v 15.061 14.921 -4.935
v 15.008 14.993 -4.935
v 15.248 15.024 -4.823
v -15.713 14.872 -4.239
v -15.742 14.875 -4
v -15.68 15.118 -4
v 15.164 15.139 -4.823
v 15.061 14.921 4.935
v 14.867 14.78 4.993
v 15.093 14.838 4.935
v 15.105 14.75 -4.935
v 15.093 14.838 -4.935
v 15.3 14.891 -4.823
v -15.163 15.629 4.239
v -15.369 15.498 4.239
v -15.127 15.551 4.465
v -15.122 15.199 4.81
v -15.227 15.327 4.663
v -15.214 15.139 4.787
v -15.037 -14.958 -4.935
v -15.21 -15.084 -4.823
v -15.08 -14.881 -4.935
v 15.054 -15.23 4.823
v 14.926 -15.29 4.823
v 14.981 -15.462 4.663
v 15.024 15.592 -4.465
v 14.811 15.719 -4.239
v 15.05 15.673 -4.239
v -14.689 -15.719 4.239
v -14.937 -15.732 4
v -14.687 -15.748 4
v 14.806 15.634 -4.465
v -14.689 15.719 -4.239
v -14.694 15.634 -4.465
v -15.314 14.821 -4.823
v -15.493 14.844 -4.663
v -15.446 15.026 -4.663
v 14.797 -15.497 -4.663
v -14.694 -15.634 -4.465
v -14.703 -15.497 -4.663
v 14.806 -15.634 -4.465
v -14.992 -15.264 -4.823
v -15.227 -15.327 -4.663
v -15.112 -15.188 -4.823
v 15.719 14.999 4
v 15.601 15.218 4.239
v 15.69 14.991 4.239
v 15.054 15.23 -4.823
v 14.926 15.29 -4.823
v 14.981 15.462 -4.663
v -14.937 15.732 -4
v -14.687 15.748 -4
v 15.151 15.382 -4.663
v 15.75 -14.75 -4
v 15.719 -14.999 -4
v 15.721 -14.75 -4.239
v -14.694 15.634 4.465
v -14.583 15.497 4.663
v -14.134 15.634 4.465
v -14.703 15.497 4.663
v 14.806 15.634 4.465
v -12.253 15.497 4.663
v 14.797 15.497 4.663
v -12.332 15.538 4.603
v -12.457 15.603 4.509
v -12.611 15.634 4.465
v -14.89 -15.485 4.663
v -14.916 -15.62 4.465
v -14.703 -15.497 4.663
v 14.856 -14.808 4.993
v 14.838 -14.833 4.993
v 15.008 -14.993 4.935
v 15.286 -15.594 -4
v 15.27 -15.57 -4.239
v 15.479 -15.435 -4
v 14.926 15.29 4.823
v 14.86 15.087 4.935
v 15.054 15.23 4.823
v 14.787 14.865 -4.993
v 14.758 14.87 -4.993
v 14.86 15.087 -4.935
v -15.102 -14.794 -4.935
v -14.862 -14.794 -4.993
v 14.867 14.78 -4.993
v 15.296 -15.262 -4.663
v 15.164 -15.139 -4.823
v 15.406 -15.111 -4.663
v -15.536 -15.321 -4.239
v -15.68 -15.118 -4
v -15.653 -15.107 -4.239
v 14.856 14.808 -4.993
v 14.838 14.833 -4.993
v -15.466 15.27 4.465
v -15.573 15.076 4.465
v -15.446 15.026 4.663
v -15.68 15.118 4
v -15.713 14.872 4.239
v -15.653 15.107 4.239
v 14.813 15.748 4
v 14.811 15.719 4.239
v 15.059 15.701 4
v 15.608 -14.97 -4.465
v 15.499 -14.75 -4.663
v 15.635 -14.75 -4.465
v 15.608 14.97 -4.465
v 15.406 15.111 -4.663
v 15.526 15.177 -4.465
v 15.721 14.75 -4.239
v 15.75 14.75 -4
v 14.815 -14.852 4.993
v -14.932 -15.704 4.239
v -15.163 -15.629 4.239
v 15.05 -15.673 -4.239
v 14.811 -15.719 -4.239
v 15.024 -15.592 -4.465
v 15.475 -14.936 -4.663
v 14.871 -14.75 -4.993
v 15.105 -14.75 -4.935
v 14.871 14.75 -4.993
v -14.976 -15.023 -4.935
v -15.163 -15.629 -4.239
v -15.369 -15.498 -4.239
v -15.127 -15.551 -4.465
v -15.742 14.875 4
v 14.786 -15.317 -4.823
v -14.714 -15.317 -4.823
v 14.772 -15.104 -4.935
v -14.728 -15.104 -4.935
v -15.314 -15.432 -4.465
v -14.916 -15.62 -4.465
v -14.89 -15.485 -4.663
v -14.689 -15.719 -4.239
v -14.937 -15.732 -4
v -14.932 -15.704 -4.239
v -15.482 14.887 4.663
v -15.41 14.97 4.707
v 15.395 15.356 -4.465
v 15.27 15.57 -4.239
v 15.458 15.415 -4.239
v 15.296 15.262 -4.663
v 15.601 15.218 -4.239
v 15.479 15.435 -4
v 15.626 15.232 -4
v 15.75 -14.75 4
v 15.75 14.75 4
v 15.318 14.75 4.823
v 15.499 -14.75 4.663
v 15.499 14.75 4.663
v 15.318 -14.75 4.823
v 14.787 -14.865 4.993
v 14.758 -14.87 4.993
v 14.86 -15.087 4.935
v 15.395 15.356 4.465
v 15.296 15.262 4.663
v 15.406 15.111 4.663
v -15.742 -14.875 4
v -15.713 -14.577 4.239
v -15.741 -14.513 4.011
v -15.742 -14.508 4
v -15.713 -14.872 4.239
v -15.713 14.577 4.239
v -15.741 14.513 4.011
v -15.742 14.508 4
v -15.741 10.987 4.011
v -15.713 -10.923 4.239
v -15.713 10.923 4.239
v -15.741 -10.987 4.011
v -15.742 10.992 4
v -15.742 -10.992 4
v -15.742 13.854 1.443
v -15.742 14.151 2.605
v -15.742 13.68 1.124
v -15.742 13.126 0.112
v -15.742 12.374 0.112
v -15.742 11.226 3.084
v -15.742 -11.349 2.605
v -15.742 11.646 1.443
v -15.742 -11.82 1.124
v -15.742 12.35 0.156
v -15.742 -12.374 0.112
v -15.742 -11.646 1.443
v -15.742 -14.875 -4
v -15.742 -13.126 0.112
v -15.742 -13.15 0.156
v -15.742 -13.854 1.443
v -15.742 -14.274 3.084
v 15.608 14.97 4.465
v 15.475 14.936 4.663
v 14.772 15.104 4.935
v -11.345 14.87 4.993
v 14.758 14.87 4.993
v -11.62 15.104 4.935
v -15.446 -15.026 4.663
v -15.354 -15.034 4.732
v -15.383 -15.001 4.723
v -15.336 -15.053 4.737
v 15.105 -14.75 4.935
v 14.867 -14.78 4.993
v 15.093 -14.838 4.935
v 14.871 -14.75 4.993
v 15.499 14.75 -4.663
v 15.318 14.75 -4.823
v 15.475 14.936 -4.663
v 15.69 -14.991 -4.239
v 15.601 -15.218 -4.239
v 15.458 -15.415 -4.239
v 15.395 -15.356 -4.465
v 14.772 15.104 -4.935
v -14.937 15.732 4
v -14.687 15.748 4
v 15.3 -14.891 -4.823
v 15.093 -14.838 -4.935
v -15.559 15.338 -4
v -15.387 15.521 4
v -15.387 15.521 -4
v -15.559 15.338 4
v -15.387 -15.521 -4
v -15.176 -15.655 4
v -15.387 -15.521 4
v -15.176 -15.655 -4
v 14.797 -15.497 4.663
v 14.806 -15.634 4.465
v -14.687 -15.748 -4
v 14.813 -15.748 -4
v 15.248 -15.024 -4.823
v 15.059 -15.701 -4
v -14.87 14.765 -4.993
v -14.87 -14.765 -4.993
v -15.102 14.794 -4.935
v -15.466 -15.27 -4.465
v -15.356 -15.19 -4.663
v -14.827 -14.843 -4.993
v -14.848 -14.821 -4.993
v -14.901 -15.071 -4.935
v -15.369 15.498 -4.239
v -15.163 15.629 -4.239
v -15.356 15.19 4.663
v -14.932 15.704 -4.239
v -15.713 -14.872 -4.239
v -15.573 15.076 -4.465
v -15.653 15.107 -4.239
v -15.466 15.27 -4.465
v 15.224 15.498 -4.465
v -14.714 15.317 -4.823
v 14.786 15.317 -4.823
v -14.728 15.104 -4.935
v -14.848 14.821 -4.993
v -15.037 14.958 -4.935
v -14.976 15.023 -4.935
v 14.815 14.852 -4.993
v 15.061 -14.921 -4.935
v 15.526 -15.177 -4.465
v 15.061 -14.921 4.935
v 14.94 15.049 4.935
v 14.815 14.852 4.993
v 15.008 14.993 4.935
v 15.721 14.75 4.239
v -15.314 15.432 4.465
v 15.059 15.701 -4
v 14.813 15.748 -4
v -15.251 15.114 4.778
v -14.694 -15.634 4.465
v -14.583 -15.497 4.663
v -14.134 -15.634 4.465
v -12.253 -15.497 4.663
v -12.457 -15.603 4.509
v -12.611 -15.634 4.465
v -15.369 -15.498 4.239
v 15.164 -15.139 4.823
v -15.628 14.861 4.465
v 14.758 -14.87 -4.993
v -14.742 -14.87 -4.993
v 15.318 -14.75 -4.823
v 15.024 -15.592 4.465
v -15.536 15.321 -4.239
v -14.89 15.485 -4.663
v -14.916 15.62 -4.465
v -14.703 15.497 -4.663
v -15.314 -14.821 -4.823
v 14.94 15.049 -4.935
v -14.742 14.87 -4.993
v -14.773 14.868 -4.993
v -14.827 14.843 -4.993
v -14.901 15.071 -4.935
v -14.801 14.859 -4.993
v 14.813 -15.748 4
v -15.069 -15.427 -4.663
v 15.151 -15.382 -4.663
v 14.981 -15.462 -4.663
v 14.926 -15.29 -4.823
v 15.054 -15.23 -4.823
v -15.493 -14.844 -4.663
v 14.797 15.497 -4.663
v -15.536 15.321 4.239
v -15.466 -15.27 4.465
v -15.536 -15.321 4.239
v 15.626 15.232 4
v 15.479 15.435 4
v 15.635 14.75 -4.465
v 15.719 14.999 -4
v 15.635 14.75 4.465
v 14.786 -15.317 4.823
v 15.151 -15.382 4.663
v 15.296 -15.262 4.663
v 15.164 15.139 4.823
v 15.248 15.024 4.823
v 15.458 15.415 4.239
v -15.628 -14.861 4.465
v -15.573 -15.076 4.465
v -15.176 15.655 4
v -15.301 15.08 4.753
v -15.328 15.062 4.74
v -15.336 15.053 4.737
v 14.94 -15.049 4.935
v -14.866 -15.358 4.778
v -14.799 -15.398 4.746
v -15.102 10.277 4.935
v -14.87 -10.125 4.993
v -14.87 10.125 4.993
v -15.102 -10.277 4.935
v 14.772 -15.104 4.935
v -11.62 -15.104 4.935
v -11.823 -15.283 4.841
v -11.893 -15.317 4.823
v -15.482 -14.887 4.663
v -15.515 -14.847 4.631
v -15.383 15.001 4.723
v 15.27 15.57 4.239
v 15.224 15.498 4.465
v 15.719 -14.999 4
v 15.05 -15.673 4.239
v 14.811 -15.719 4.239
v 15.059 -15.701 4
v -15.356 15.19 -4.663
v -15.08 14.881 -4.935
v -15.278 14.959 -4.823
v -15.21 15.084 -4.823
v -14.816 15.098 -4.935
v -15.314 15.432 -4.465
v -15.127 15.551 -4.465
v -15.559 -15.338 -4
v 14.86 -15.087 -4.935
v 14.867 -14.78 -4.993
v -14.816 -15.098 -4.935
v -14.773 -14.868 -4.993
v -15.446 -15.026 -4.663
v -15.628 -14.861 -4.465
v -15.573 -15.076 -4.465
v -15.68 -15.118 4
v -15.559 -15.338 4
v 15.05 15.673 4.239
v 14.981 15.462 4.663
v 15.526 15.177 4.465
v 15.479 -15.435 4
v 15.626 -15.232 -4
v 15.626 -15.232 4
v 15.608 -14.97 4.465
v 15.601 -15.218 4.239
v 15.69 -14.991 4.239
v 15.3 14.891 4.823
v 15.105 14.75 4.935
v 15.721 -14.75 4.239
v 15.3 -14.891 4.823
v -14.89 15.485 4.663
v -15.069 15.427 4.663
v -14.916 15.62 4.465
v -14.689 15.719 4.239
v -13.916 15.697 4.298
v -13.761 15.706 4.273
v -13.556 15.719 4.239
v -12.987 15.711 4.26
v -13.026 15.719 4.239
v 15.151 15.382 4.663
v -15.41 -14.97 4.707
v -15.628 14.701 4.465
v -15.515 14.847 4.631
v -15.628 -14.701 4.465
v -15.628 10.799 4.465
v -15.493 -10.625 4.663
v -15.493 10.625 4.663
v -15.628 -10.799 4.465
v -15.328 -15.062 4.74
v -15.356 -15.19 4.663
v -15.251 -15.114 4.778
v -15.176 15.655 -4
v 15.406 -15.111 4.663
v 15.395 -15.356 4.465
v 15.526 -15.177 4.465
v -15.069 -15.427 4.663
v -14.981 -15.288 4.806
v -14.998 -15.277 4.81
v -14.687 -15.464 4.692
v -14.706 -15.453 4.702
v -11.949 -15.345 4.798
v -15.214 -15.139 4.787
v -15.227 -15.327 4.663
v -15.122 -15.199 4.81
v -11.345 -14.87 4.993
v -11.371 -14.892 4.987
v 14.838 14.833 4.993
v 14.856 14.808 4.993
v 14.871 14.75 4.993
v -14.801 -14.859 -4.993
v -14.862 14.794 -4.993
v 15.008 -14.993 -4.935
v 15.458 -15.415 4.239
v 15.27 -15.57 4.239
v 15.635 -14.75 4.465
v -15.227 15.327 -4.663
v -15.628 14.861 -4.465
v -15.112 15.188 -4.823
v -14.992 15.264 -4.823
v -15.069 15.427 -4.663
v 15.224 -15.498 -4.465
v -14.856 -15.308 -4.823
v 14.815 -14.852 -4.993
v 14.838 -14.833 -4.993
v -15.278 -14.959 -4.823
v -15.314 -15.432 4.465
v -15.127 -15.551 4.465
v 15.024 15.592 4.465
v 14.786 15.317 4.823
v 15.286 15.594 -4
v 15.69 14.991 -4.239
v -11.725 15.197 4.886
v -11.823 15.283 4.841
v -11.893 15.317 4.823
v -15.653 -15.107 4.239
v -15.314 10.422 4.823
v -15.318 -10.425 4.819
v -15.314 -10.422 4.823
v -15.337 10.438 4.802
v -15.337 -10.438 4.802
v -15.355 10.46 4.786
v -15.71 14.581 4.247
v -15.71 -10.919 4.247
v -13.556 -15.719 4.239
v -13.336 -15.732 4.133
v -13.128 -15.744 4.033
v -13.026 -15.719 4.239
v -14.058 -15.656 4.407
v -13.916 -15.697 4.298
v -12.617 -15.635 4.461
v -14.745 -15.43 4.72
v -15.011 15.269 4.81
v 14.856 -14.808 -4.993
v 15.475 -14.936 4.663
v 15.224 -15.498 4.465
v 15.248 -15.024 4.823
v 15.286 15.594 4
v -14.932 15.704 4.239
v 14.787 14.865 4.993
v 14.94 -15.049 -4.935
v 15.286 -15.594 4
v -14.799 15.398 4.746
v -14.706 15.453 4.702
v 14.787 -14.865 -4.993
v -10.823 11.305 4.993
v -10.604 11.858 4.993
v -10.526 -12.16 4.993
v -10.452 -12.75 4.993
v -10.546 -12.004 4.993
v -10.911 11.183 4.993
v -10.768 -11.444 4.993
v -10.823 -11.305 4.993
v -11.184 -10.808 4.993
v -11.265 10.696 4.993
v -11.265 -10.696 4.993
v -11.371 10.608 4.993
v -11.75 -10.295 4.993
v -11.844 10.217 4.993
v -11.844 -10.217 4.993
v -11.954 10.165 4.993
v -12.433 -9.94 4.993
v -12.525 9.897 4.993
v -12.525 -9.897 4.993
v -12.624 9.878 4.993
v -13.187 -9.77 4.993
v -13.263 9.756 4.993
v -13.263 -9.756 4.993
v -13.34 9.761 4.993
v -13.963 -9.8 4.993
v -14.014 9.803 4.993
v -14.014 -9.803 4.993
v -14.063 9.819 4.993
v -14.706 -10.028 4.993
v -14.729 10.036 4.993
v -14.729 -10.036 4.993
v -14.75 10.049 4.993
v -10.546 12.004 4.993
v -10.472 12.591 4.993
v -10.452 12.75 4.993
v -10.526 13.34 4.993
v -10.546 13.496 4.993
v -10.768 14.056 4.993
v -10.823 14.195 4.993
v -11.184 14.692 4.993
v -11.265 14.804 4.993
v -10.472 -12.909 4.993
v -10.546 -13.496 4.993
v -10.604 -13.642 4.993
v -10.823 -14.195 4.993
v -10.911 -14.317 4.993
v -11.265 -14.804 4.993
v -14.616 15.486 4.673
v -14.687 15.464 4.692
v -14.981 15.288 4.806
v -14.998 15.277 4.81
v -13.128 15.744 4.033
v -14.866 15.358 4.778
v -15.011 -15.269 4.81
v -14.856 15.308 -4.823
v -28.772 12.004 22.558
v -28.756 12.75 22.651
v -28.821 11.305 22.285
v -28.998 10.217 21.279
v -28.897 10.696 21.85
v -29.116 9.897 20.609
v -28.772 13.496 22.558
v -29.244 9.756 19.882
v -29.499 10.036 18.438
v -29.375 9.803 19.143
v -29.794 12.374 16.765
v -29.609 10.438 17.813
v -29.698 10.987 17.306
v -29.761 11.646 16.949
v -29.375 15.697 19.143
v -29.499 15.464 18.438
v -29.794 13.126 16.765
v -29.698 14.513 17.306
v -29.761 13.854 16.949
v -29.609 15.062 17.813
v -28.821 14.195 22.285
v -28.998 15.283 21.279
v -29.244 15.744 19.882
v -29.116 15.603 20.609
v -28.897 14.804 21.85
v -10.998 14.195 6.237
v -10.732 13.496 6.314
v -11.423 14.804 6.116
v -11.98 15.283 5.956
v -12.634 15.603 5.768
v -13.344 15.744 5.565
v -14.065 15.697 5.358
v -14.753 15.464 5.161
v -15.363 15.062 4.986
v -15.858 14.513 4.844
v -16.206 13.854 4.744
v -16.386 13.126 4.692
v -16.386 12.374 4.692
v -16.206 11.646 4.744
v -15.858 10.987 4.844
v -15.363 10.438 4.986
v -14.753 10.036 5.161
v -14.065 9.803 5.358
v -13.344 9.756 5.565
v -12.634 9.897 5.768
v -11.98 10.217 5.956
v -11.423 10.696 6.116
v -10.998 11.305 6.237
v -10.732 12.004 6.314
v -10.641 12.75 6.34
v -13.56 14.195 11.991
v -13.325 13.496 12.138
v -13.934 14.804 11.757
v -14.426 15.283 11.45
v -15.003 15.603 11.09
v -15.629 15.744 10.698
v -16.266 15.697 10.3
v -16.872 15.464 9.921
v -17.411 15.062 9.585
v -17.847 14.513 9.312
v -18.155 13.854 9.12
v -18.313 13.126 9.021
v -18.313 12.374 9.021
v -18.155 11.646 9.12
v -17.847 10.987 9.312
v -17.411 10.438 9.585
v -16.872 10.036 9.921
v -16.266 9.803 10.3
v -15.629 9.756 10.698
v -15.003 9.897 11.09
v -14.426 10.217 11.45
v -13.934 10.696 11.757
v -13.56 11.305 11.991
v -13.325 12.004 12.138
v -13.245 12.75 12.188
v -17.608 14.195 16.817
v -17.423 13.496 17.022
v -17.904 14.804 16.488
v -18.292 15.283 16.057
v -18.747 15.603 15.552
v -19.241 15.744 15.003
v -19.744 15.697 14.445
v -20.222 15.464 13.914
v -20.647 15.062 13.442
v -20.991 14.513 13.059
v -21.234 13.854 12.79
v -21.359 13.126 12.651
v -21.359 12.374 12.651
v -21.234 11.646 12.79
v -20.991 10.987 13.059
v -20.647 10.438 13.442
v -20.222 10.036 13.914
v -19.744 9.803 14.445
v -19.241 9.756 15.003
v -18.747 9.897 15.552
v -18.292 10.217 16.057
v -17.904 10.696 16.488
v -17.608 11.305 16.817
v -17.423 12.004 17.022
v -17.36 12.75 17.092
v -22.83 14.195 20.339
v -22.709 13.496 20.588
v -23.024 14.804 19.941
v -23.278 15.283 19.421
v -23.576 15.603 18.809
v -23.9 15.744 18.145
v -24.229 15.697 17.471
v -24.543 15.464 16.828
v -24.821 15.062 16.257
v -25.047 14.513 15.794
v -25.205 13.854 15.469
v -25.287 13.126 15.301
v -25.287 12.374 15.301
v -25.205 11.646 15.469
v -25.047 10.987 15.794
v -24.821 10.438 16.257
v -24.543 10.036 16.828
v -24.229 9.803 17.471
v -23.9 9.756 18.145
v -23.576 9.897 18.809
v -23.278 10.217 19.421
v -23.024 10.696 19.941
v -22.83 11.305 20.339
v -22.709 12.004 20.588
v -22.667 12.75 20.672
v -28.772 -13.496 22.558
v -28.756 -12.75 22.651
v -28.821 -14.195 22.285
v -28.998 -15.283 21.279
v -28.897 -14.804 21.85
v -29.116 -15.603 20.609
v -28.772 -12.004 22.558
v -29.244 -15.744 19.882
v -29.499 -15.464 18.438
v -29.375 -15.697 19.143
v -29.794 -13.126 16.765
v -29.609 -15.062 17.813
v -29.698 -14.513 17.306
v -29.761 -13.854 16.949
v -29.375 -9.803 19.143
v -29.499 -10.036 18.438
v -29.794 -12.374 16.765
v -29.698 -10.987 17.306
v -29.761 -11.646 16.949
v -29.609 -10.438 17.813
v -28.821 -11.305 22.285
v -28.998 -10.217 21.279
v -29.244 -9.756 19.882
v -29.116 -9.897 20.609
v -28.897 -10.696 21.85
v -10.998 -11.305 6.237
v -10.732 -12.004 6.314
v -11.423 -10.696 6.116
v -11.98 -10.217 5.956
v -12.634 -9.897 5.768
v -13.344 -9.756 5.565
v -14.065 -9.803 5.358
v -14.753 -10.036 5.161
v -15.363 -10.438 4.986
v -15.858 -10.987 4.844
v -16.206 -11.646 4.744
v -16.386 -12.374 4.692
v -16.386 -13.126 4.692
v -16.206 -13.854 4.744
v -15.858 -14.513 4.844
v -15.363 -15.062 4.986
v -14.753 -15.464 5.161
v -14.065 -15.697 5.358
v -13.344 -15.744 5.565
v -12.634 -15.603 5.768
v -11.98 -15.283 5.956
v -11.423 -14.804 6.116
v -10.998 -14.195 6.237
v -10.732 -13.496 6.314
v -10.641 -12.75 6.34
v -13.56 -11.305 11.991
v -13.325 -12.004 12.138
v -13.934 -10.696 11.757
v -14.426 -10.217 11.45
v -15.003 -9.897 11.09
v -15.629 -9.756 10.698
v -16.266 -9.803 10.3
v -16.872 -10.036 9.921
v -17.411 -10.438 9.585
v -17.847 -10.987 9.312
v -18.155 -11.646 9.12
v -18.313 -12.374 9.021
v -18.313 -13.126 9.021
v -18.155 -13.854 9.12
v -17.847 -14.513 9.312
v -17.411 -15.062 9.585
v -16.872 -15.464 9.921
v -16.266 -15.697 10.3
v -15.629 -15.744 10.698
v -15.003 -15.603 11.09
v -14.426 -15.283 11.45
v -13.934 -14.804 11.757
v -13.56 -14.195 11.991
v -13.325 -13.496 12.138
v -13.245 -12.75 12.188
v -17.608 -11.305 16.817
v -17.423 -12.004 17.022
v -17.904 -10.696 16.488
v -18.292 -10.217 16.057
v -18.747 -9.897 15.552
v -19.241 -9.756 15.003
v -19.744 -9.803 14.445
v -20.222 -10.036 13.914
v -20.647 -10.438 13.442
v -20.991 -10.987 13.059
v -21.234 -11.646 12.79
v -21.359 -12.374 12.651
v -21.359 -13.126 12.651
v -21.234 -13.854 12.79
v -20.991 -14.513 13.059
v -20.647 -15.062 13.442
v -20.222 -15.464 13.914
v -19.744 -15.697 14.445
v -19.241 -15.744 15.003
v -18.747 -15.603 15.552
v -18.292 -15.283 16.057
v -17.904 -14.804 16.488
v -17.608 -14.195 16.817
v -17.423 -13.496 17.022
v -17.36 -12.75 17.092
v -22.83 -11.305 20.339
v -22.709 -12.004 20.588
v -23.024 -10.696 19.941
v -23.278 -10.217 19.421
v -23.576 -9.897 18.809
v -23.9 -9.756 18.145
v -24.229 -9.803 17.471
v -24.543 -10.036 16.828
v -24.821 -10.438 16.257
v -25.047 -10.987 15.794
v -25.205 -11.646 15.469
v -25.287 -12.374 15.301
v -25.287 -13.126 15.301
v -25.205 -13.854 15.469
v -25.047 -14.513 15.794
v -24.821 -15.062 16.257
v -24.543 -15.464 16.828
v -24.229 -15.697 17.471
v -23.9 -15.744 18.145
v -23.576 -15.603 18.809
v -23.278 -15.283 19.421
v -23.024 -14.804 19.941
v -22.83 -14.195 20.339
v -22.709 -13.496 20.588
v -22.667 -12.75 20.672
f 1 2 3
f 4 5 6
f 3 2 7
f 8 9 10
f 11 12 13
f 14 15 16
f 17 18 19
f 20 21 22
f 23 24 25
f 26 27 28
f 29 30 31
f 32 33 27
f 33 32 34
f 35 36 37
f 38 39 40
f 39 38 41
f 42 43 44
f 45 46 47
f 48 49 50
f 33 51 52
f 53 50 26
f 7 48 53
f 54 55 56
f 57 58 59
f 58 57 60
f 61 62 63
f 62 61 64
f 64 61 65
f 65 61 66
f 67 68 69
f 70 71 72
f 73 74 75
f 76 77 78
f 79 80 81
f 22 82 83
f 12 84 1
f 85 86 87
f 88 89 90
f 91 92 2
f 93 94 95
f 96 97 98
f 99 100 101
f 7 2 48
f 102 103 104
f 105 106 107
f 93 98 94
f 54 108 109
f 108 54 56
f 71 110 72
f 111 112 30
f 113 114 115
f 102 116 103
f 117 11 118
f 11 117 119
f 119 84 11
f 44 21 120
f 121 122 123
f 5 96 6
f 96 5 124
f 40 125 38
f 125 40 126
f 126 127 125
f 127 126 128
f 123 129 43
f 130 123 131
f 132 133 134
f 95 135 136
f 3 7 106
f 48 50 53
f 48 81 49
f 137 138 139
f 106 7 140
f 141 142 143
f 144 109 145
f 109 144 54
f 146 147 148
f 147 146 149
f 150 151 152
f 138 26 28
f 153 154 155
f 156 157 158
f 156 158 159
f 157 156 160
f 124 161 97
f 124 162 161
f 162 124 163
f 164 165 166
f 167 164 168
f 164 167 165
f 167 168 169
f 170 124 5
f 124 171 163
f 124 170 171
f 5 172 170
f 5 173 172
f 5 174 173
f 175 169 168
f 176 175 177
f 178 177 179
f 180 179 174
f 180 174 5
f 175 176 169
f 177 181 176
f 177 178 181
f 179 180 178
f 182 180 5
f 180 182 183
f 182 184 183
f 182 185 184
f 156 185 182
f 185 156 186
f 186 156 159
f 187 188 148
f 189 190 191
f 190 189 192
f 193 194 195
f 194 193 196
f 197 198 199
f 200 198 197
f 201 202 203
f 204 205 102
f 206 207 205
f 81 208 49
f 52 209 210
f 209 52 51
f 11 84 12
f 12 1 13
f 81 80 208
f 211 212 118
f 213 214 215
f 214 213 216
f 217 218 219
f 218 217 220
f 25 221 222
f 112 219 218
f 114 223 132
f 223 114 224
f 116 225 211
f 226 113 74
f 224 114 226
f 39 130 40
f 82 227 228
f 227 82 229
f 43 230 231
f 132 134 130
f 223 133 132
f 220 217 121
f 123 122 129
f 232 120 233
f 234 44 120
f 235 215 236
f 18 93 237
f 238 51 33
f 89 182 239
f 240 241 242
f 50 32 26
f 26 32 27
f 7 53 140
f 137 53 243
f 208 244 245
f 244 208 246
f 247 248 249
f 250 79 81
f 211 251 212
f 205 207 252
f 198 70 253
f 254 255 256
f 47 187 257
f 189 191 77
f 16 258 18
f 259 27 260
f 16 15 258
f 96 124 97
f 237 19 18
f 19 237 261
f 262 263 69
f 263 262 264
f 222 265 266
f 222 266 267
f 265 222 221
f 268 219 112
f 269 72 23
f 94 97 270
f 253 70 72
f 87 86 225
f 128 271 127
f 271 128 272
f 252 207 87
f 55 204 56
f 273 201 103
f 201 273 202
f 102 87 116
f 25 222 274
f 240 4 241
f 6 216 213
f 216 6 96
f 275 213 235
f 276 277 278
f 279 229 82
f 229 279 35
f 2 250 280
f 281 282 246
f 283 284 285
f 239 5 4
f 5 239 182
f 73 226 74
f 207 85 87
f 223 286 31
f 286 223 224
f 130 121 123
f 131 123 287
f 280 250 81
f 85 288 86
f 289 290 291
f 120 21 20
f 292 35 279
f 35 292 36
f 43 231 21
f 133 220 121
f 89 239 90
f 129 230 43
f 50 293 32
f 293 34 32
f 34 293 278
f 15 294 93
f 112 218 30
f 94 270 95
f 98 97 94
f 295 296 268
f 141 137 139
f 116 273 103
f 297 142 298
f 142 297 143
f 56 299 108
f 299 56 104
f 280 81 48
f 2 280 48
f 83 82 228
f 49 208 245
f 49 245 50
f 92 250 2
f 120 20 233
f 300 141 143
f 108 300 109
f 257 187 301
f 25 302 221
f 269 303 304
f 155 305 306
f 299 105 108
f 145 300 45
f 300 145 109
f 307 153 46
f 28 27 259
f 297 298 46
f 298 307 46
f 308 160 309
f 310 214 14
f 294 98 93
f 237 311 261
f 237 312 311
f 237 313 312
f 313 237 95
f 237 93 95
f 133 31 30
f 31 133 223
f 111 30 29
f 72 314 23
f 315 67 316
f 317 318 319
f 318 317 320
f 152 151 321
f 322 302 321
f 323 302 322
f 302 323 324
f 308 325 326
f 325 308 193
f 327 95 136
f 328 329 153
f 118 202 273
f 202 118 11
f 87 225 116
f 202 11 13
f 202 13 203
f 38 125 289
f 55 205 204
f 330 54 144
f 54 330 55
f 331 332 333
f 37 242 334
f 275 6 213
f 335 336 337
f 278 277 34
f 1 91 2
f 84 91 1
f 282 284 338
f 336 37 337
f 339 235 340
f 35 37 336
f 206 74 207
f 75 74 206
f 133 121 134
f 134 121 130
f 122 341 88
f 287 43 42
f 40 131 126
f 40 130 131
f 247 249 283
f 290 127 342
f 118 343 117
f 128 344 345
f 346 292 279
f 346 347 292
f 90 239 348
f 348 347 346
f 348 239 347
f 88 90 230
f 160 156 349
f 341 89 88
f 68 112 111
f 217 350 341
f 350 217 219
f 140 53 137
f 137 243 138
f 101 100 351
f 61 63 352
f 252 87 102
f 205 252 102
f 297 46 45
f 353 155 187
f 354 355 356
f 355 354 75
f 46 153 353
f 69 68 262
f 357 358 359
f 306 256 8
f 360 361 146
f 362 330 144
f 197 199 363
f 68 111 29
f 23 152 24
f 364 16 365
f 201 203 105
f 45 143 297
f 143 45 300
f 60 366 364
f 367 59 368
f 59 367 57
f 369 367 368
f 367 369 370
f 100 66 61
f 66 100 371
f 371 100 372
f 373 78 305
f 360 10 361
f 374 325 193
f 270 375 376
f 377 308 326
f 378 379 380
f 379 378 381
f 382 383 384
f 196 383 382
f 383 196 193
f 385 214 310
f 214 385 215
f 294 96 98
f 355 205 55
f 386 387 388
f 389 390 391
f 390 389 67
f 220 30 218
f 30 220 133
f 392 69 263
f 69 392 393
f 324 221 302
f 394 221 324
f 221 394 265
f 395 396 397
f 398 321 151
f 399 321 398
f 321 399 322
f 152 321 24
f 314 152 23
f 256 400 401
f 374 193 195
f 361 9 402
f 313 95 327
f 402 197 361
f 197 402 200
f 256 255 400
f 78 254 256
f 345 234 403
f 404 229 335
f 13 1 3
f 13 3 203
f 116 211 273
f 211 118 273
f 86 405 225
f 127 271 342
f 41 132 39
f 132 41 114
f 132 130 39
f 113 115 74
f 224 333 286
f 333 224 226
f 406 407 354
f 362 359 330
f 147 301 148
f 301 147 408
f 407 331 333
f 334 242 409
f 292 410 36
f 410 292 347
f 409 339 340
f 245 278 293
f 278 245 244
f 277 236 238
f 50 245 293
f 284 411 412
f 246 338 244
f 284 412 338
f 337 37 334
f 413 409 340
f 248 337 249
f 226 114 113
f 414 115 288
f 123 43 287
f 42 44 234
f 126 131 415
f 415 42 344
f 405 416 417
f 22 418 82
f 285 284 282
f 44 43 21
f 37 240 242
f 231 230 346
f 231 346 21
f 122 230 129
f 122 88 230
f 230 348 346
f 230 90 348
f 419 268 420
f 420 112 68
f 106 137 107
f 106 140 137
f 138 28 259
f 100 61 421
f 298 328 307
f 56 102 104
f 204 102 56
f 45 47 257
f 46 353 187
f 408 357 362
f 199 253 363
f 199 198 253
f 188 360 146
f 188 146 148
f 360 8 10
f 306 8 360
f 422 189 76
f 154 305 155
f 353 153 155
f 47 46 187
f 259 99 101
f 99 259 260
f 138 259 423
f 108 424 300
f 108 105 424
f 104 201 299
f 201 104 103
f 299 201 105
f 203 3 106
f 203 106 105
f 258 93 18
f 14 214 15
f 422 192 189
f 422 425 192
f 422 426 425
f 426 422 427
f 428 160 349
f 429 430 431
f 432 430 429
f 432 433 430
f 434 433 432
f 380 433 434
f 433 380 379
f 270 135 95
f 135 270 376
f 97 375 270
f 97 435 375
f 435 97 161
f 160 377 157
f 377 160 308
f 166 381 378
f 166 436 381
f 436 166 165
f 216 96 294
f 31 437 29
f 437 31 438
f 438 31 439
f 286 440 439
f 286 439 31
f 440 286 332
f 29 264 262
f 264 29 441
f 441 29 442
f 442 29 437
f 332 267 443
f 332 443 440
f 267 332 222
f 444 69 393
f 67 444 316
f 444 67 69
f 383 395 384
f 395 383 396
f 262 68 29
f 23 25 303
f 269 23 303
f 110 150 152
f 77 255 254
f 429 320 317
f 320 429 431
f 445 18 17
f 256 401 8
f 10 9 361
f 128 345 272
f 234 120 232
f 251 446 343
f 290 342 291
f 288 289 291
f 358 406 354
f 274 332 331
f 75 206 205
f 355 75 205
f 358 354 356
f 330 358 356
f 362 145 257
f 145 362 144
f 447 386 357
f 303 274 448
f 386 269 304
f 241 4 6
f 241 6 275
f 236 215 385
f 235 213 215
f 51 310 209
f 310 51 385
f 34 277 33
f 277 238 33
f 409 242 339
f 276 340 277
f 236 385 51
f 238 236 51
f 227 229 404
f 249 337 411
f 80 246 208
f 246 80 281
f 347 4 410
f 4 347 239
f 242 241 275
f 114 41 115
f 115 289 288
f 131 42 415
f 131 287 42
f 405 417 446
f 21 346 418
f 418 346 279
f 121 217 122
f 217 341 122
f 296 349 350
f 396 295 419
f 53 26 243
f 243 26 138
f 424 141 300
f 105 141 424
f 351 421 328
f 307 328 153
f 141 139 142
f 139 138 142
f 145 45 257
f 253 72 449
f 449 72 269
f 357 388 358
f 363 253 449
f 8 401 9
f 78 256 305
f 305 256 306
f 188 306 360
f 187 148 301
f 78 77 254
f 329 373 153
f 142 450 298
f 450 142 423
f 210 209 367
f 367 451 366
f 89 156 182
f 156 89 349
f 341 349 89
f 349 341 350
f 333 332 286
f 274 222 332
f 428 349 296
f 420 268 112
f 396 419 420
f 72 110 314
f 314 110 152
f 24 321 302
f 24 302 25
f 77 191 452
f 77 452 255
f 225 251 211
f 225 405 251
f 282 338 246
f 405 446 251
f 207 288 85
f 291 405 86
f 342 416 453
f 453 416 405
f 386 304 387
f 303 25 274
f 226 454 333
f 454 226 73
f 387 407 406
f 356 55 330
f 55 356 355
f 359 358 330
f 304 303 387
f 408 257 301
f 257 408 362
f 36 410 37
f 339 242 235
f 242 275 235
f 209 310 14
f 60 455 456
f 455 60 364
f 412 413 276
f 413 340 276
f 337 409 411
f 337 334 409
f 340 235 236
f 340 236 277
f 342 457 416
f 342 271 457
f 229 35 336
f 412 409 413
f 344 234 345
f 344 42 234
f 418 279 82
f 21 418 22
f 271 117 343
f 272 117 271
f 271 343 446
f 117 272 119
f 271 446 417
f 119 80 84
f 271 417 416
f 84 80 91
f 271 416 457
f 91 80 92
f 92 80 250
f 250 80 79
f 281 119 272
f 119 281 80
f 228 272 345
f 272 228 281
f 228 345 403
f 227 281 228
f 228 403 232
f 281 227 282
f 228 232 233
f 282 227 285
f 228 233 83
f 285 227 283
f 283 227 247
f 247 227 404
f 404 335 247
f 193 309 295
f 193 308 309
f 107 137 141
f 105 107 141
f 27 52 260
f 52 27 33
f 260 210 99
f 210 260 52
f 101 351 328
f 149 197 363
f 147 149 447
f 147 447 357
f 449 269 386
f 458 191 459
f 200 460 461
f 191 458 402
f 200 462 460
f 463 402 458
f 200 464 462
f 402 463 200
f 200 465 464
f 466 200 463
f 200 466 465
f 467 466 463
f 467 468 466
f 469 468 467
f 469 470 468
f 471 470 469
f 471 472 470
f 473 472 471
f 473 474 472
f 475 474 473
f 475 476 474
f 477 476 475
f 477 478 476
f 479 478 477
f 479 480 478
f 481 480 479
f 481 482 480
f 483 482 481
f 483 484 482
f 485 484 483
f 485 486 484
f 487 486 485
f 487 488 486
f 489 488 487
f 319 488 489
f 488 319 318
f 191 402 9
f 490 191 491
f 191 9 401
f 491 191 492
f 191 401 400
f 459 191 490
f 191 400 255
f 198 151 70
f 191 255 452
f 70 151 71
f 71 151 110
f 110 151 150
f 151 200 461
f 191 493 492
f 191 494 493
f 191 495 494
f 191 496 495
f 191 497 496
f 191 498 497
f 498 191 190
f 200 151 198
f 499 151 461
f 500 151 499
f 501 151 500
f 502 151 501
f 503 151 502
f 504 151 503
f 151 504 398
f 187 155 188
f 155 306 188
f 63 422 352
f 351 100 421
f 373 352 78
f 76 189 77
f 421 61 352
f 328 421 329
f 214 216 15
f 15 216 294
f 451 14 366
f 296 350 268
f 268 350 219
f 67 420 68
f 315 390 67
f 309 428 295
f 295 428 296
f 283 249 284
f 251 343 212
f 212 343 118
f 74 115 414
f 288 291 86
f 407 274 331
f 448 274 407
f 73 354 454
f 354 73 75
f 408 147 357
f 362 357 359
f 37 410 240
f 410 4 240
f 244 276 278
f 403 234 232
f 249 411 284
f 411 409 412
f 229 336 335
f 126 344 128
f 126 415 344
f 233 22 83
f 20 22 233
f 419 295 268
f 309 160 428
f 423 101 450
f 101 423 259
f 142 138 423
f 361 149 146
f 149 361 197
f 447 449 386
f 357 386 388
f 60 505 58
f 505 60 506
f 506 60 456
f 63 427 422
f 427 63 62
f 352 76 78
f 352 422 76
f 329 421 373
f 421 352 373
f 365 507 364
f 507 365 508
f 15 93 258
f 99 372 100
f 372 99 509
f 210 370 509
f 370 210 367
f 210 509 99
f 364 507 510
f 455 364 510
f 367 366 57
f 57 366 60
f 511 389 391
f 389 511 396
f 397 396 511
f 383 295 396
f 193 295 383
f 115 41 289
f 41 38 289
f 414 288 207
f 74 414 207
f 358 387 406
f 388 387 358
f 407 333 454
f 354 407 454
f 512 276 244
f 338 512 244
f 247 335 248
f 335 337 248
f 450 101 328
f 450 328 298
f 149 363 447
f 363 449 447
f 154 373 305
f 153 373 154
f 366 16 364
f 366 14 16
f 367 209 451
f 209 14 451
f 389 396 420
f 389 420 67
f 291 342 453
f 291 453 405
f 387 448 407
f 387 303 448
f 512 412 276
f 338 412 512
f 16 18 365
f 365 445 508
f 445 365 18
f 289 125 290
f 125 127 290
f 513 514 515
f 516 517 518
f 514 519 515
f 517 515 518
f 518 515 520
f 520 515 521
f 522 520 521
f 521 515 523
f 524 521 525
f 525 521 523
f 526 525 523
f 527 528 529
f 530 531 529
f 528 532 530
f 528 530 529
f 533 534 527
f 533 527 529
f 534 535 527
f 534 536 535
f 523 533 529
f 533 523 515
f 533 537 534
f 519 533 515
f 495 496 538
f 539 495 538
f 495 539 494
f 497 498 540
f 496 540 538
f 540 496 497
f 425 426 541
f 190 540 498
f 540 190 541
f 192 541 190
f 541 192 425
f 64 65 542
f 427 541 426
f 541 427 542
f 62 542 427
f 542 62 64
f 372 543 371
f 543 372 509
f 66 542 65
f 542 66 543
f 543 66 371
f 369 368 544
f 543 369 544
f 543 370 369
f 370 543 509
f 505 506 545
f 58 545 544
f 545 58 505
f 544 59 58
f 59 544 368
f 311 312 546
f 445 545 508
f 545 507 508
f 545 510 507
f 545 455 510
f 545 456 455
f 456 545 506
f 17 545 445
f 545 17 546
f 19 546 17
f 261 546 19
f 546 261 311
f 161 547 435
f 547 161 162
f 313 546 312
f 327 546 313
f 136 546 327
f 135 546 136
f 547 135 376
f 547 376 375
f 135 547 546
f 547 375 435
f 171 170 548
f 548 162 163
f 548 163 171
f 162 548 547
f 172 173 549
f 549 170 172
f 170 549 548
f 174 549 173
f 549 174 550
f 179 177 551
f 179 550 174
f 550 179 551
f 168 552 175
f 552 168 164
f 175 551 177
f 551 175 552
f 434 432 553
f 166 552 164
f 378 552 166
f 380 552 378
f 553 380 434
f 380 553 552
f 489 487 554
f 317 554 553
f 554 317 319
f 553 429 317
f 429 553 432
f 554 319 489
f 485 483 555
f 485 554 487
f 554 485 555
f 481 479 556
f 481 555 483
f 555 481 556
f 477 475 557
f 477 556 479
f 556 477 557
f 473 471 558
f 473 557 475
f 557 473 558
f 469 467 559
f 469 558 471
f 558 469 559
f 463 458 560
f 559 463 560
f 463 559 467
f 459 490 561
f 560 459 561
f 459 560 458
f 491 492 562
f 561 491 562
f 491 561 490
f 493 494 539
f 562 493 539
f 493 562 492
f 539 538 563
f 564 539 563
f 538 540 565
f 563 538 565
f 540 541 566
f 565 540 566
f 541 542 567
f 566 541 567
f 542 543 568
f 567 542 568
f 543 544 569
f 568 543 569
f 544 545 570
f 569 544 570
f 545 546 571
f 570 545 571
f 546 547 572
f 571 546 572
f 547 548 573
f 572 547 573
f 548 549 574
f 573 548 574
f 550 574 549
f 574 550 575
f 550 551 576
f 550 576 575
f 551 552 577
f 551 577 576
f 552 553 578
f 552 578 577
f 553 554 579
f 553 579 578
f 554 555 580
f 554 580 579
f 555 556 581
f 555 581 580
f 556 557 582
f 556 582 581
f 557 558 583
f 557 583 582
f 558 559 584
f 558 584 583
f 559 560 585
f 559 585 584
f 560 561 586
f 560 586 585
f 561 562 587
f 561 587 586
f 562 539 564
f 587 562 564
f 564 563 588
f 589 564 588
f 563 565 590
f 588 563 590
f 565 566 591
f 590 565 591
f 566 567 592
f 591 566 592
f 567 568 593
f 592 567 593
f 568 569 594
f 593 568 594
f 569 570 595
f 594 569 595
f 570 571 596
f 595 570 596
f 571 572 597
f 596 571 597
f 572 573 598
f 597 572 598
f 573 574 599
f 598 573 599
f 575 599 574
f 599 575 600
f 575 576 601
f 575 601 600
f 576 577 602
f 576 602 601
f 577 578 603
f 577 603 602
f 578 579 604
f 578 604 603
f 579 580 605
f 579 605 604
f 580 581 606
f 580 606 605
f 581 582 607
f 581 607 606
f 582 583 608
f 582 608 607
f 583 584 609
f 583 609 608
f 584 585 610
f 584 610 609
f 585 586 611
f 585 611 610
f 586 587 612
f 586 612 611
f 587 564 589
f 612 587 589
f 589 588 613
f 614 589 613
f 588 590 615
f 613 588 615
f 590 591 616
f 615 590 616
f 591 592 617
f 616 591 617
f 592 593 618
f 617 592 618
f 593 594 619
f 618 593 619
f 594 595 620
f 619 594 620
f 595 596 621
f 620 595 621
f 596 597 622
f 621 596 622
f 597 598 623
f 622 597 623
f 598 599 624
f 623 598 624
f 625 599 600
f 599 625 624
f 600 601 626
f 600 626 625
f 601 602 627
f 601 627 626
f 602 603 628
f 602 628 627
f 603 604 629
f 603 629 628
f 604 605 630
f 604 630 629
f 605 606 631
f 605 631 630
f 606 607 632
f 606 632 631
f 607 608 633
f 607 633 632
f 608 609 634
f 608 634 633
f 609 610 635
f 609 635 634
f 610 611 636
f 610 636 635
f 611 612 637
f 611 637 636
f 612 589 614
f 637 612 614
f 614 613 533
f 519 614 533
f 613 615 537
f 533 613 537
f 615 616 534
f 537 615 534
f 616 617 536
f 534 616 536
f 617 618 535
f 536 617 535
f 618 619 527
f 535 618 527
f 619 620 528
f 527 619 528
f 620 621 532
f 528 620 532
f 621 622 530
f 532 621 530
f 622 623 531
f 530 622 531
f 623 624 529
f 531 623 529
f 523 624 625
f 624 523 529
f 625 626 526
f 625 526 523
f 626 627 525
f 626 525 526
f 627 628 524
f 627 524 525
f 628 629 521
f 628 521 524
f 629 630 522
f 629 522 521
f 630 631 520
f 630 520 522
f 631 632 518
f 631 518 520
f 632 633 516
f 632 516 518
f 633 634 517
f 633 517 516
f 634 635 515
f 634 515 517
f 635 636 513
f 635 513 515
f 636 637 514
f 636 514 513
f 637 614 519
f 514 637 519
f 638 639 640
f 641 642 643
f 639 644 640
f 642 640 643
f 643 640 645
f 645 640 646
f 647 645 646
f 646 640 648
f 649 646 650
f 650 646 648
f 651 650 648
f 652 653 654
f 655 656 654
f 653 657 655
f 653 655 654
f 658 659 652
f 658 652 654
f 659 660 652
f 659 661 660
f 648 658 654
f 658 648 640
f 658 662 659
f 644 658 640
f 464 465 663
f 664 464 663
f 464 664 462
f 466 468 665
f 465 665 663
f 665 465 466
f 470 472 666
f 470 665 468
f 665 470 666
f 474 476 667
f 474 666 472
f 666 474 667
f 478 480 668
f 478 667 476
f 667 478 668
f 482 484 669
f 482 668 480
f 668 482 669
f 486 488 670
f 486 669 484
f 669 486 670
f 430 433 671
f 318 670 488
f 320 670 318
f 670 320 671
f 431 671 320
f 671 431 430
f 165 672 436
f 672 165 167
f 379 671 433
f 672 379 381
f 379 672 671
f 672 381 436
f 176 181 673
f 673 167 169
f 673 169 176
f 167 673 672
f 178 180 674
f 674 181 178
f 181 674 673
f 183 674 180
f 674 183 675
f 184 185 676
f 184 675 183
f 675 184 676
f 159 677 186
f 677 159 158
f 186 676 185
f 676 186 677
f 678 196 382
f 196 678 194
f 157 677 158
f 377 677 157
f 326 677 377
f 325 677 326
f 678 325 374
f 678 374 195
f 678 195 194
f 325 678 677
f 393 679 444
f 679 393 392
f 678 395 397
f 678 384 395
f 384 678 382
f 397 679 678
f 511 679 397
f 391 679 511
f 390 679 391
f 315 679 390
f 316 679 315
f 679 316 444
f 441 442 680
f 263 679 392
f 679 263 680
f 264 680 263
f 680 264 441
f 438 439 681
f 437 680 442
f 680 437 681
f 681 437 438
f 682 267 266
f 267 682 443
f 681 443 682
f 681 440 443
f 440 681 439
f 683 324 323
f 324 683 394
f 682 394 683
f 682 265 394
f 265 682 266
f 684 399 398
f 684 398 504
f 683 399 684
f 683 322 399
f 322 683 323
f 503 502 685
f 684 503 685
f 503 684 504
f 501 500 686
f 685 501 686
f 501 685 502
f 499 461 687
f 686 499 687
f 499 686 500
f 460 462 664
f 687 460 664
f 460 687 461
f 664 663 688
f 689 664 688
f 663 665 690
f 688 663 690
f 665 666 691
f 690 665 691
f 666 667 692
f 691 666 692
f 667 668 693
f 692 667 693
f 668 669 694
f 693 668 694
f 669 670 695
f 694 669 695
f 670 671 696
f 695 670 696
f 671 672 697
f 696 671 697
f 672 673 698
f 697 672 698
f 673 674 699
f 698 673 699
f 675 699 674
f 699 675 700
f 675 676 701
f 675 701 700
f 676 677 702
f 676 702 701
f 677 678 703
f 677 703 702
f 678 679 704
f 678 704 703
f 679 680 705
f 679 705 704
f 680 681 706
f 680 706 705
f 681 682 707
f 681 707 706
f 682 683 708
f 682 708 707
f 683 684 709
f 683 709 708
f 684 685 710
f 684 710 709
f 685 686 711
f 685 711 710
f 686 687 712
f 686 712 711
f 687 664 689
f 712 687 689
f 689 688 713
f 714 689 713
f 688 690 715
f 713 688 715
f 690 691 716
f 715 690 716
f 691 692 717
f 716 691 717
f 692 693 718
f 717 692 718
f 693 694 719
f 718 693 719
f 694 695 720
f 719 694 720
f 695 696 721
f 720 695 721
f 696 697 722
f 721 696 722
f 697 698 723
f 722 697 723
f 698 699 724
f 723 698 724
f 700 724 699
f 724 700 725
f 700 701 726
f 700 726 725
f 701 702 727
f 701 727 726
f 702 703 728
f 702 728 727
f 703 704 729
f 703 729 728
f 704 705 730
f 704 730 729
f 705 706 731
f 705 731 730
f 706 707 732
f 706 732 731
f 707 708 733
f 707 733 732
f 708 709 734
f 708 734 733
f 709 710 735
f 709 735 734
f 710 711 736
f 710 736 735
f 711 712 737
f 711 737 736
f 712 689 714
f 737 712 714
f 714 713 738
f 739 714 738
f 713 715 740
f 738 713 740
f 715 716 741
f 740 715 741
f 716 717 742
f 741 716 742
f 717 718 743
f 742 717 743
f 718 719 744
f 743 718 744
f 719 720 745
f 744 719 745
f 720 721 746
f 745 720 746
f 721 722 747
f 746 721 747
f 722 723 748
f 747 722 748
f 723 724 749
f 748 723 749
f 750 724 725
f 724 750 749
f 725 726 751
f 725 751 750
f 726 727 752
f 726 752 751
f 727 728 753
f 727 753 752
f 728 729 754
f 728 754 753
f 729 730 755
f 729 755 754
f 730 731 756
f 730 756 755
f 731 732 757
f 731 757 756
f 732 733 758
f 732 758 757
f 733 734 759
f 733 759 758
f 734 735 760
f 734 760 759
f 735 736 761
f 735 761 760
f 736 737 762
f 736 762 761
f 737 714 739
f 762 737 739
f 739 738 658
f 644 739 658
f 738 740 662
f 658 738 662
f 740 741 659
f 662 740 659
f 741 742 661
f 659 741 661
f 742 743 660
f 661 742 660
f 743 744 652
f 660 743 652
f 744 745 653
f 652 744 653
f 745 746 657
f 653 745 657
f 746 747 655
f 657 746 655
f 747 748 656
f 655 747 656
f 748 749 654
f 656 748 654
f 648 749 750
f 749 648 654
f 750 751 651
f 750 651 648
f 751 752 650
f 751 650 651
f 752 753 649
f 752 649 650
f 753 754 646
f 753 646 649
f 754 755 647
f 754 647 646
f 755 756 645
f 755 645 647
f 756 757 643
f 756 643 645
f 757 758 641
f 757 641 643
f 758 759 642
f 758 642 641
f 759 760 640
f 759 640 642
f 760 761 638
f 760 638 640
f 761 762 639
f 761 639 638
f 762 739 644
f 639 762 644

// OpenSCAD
$fn = 25;

roundcorner = 2; 

color("blue") minkowski() {
    cube([25.5 - roundcorner + 6, 25.5 - roundcorner + 6, 10 - roundcorner], center = true);
    sphere(d = roundcorner);
}

//translate([1, 1, 1])  
cube([15.5, 25.5, 9], center = true);

translate([(-12.75 - 20), 12.75, 0]) 
rotate([90, 0, 0]) {
    color("red") rotate_extrude(angle=80) {
        translate([20, 0]) {
           circle(d=6);
        }
    }
}

translate([(-12.75 - 20), -12.75, 0]) 
rotate([90, 0, 0]) {
    color("red") rotate_extrude(angle=80) {
        translate([20, 0]) {
           circle(d=6);
        }
    }
}
